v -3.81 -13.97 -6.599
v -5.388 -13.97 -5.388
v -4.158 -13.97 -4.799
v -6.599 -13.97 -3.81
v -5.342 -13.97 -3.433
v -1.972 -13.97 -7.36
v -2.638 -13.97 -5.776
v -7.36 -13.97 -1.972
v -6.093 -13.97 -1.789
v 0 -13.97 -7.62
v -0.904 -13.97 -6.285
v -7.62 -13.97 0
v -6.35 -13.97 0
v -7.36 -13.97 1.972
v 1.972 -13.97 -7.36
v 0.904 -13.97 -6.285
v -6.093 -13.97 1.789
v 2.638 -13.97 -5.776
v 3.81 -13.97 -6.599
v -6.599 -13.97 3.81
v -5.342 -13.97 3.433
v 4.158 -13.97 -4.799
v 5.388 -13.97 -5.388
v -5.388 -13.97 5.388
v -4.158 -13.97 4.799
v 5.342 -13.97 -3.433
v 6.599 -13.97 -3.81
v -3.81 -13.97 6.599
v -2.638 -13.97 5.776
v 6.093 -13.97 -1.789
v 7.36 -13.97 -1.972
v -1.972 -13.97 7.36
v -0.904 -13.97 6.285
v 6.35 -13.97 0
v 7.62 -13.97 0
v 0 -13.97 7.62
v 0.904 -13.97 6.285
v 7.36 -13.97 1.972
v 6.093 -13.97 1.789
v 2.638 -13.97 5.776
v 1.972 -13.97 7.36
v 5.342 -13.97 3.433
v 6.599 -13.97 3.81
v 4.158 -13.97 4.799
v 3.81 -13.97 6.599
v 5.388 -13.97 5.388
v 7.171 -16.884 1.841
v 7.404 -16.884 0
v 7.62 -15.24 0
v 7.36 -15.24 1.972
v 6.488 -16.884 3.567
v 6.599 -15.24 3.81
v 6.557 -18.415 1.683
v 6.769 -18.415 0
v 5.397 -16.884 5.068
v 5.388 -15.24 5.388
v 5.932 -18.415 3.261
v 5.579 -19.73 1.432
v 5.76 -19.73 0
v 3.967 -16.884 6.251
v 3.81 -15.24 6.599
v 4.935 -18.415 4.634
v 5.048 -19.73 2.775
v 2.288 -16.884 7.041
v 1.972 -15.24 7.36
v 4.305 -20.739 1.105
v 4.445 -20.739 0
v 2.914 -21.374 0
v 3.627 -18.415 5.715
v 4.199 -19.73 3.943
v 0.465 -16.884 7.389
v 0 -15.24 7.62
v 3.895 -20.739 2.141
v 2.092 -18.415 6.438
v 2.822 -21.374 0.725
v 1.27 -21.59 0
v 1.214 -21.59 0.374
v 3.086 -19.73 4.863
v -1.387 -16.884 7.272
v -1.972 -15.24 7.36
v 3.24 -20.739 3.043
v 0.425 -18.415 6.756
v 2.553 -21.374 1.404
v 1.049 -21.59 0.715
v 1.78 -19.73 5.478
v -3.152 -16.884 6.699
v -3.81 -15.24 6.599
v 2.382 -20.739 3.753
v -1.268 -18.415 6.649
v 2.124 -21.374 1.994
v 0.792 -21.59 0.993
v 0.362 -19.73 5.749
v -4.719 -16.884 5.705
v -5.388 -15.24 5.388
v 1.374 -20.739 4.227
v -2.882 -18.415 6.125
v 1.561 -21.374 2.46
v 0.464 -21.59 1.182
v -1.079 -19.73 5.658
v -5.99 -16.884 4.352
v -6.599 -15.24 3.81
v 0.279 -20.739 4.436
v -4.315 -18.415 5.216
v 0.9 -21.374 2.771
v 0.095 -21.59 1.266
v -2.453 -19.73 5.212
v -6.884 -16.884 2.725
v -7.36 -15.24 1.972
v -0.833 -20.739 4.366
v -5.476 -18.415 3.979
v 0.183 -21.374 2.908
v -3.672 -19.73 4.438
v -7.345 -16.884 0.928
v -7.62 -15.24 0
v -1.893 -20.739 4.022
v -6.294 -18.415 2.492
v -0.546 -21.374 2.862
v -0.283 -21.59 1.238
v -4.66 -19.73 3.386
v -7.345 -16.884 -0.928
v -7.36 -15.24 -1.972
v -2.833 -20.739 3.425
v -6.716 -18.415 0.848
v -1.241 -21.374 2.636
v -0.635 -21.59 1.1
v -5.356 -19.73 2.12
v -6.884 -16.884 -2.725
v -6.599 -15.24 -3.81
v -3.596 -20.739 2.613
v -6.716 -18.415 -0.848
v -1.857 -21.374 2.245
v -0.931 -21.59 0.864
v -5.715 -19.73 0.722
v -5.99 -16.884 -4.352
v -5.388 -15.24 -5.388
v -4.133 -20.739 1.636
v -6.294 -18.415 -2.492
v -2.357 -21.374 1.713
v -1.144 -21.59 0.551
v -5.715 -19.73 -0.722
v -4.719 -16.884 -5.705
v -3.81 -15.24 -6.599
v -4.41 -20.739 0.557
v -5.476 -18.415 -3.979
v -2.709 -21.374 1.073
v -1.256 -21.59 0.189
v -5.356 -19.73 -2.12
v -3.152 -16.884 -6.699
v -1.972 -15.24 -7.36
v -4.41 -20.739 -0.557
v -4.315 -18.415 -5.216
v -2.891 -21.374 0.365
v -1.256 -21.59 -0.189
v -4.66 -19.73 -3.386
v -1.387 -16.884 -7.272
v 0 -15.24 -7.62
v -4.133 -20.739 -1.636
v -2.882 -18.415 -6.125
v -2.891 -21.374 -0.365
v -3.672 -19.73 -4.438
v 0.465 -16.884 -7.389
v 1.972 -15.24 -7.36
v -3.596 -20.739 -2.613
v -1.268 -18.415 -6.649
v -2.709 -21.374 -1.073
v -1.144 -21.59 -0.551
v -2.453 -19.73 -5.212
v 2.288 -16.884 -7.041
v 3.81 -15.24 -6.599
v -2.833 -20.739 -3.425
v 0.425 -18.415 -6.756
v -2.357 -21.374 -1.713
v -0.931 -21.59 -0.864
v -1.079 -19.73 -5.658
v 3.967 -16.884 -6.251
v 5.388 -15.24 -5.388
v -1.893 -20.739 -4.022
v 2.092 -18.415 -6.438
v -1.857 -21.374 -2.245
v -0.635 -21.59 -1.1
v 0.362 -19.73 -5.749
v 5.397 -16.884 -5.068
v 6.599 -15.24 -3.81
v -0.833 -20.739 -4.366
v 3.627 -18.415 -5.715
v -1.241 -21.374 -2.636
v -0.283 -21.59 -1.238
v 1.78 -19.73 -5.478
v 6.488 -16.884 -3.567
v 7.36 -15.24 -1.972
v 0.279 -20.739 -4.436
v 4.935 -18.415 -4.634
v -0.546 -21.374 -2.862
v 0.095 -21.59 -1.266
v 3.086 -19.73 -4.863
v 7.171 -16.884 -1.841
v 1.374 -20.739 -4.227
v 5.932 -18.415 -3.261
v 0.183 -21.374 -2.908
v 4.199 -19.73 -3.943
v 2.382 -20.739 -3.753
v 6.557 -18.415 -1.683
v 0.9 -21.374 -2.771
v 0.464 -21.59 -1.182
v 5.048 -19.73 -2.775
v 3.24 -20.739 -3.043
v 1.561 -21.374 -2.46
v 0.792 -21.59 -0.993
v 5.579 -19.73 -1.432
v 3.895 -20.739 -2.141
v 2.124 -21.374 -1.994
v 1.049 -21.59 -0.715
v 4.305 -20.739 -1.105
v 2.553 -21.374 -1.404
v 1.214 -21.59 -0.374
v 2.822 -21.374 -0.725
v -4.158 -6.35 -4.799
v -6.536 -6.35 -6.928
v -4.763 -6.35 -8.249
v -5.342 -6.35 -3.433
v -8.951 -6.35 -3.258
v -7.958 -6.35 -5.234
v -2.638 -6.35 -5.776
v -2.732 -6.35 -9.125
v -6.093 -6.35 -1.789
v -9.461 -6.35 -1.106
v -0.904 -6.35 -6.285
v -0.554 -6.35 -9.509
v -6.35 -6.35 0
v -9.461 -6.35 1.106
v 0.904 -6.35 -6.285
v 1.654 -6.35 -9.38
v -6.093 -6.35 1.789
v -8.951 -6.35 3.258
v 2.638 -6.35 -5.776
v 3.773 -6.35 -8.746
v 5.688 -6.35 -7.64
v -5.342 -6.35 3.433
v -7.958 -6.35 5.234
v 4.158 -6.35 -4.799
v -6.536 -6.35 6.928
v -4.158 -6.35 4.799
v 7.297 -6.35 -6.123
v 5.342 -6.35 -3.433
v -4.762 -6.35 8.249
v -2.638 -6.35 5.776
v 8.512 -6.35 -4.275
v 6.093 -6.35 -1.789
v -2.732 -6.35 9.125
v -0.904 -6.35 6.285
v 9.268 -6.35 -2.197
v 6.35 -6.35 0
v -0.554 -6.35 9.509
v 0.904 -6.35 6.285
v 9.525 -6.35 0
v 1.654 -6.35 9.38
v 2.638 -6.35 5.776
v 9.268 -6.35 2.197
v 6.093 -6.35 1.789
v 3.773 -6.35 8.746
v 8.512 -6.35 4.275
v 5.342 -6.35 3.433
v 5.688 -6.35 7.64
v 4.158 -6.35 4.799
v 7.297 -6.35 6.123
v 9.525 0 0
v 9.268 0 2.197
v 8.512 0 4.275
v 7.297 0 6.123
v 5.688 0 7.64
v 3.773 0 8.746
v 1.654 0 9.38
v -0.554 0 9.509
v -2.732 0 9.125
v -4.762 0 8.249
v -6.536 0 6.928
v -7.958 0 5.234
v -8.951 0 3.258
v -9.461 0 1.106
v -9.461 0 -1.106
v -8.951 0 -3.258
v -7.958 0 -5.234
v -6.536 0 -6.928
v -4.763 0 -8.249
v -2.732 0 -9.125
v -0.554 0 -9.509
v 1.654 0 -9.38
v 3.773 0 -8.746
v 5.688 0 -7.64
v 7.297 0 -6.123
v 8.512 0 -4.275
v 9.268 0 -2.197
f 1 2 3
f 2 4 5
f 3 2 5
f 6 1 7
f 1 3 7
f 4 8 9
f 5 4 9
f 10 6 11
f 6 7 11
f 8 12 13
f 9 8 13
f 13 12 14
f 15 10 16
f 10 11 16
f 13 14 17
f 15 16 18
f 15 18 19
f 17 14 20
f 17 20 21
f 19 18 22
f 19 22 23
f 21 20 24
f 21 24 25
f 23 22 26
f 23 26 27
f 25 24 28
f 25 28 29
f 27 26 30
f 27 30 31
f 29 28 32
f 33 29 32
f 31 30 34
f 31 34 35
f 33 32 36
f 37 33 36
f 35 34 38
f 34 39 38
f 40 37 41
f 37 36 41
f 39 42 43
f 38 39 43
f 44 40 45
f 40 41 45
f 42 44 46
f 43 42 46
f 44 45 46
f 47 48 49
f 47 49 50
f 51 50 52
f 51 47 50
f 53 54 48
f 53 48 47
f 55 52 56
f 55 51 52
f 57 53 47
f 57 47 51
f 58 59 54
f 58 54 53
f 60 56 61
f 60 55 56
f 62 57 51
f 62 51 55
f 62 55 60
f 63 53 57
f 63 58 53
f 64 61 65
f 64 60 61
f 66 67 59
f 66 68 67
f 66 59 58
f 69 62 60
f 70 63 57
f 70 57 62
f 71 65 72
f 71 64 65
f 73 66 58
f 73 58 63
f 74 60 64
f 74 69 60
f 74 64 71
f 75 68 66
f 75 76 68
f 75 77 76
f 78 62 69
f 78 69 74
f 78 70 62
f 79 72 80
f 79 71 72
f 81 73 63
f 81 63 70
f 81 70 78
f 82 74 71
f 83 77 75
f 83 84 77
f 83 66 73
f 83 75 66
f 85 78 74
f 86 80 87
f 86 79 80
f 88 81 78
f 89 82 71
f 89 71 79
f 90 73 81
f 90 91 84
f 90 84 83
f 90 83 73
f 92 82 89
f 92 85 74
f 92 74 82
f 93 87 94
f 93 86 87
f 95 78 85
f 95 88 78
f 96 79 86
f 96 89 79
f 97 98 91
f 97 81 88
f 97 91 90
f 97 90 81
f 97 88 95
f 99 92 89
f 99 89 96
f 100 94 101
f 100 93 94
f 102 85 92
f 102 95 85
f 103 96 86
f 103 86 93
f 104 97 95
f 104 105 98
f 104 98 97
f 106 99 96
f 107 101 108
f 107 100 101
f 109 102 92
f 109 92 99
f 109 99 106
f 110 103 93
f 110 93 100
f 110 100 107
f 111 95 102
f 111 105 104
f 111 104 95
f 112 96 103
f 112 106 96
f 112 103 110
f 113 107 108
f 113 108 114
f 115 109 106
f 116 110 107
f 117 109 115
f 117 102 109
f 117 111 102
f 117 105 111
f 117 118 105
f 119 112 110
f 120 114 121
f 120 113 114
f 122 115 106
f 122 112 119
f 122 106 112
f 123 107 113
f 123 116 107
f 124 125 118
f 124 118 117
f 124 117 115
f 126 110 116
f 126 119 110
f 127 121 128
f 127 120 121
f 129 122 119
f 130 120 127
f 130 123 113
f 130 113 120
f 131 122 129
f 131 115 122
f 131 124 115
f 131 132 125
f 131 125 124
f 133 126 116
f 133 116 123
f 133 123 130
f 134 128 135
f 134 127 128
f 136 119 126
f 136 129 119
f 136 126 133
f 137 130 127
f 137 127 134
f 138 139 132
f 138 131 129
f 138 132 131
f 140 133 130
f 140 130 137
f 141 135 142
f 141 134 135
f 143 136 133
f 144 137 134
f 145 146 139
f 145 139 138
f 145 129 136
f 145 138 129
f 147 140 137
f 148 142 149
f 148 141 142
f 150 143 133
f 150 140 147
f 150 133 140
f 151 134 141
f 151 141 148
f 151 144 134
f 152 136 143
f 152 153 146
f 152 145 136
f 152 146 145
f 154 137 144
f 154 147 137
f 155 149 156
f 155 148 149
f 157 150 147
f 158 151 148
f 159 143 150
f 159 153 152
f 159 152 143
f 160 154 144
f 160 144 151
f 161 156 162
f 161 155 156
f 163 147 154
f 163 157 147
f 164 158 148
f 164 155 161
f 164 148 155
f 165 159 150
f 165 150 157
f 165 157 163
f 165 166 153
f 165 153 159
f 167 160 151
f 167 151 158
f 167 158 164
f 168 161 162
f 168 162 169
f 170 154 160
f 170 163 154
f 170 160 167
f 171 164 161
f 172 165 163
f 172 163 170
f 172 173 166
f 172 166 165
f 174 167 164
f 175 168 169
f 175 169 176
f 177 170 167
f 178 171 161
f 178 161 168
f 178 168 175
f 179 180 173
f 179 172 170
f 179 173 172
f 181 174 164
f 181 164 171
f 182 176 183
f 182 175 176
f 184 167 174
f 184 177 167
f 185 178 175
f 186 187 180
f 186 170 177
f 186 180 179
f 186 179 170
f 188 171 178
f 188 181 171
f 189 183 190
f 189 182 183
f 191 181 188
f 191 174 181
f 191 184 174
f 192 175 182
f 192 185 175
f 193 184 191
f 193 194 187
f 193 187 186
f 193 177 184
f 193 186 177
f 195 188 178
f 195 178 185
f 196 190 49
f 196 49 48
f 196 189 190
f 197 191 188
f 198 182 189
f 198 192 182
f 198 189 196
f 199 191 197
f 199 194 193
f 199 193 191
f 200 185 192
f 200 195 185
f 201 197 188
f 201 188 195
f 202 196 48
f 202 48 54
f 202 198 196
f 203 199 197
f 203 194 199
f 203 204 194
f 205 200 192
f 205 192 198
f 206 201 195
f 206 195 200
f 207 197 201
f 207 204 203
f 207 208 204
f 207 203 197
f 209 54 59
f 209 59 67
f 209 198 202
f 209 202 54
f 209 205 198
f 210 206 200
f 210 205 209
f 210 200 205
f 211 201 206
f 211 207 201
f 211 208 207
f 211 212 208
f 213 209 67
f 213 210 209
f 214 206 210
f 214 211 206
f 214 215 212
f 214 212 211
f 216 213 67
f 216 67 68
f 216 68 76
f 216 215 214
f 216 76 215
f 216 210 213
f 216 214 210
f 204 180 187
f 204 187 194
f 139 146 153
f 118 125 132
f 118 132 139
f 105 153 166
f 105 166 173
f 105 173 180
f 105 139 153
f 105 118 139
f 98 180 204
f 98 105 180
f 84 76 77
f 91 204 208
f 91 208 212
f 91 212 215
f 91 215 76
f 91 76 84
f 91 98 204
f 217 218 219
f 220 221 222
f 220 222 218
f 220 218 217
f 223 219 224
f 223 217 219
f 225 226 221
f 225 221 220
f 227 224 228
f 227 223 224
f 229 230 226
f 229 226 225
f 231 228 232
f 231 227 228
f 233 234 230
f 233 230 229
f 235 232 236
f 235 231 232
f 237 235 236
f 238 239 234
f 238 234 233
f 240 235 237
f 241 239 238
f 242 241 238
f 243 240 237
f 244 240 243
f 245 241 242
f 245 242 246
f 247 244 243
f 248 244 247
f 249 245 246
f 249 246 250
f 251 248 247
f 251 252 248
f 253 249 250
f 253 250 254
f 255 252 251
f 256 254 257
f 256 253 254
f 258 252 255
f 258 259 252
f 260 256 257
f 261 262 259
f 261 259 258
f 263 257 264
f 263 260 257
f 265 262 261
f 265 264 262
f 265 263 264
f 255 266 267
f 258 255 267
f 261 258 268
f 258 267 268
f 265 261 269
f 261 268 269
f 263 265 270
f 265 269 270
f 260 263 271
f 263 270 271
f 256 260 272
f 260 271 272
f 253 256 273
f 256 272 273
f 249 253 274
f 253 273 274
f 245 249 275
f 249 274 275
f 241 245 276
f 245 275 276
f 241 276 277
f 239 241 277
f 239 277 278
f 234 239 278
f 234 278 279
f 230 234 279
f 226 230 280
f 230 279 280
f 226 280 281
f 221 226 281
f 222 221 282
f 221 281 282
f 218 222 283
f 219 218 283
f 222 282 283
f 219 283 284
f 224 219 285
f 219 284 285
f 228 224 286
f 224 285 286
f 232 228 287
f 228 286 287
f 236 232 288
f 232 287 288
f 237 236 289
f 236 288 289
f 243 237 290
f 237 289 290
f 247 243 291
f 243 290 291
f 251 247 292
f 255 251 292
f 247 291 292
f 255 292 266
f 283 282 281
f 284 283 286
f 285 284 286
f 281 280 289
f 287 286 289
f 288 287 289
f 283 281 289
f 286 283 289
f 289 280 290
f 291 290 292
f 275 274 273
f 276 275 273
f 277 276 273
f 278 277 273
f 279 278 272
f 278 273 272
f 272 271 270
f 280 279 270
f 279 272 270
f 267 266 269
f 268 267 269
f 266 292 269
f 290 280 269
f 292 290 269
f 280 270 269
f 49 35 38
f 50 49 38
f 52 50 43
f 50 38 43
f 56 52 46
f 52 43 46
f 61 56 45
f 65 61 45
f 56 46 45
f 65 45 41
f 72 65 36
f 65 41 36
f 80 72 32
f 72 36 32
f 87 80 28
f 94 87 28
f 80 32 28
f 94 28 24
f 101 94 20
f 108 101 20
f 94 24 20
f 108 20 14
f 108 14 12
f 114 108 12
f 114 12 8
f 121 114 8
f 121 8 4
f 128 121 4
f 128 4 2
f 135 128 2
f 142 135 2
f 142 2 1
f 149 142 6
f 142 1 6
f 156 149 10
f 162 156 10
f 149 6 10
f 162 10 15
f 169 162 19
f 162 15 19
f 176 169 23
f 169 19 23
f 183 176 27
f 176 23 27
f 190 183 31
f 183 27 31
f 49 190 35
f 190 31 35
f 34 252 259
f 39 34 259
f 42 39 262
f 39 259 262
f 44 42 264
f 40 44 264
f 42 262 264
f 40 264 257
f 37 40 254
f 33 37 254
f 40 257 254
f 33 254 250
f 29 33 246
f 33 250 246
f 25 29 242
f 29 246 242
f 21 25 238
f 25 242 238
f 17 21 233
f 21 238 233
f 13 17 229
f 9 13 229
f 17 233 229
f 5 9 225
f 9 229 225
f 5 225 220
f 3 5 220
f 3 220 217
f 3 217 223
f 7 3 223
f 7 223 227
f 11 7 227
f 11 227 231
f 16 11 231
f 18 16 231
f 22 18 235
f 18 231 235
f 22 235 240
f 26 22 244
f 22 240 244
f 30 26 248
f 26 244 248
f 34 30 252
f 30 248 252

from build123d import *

# Parameters (mm, degrees)
F0_R     = 9.525
F1_DEPTH = 6.35
F2_R     = 6.35
F3_DEPTH = 7.62
F4_R     = 7.62
F5_DEPTH = 7.62
F6_R     = 6.35


with BuildPart() as f1:
    # F0 (on Front) → F1 (new body)
    with BuildSketch(Plane.XZ):
        Circle(F0_R)
    extrude(amount=F1_DEPTH)

    # F2 (on face) → F3 (join)
    with BuildSketch(Plane.XZ.offset(6.35)):
        Circle(F2_R)
    extrude(amount=F3_DEPTH)

    # F4 (on face) → F5 (join)
    with BuildSketch(Plane.XZ.offset(13.97)):
        Circle(F4_R)
    extrude(amount=F5_DEPTH)

    # F6
    f6_edges = [f1.edges().sort_by_distance(p)[0] for p in [
        (-7.62, -21.59, 0),
    ]]
    fillet(f6_edges, radius=F6_R)


solid = f1.part
